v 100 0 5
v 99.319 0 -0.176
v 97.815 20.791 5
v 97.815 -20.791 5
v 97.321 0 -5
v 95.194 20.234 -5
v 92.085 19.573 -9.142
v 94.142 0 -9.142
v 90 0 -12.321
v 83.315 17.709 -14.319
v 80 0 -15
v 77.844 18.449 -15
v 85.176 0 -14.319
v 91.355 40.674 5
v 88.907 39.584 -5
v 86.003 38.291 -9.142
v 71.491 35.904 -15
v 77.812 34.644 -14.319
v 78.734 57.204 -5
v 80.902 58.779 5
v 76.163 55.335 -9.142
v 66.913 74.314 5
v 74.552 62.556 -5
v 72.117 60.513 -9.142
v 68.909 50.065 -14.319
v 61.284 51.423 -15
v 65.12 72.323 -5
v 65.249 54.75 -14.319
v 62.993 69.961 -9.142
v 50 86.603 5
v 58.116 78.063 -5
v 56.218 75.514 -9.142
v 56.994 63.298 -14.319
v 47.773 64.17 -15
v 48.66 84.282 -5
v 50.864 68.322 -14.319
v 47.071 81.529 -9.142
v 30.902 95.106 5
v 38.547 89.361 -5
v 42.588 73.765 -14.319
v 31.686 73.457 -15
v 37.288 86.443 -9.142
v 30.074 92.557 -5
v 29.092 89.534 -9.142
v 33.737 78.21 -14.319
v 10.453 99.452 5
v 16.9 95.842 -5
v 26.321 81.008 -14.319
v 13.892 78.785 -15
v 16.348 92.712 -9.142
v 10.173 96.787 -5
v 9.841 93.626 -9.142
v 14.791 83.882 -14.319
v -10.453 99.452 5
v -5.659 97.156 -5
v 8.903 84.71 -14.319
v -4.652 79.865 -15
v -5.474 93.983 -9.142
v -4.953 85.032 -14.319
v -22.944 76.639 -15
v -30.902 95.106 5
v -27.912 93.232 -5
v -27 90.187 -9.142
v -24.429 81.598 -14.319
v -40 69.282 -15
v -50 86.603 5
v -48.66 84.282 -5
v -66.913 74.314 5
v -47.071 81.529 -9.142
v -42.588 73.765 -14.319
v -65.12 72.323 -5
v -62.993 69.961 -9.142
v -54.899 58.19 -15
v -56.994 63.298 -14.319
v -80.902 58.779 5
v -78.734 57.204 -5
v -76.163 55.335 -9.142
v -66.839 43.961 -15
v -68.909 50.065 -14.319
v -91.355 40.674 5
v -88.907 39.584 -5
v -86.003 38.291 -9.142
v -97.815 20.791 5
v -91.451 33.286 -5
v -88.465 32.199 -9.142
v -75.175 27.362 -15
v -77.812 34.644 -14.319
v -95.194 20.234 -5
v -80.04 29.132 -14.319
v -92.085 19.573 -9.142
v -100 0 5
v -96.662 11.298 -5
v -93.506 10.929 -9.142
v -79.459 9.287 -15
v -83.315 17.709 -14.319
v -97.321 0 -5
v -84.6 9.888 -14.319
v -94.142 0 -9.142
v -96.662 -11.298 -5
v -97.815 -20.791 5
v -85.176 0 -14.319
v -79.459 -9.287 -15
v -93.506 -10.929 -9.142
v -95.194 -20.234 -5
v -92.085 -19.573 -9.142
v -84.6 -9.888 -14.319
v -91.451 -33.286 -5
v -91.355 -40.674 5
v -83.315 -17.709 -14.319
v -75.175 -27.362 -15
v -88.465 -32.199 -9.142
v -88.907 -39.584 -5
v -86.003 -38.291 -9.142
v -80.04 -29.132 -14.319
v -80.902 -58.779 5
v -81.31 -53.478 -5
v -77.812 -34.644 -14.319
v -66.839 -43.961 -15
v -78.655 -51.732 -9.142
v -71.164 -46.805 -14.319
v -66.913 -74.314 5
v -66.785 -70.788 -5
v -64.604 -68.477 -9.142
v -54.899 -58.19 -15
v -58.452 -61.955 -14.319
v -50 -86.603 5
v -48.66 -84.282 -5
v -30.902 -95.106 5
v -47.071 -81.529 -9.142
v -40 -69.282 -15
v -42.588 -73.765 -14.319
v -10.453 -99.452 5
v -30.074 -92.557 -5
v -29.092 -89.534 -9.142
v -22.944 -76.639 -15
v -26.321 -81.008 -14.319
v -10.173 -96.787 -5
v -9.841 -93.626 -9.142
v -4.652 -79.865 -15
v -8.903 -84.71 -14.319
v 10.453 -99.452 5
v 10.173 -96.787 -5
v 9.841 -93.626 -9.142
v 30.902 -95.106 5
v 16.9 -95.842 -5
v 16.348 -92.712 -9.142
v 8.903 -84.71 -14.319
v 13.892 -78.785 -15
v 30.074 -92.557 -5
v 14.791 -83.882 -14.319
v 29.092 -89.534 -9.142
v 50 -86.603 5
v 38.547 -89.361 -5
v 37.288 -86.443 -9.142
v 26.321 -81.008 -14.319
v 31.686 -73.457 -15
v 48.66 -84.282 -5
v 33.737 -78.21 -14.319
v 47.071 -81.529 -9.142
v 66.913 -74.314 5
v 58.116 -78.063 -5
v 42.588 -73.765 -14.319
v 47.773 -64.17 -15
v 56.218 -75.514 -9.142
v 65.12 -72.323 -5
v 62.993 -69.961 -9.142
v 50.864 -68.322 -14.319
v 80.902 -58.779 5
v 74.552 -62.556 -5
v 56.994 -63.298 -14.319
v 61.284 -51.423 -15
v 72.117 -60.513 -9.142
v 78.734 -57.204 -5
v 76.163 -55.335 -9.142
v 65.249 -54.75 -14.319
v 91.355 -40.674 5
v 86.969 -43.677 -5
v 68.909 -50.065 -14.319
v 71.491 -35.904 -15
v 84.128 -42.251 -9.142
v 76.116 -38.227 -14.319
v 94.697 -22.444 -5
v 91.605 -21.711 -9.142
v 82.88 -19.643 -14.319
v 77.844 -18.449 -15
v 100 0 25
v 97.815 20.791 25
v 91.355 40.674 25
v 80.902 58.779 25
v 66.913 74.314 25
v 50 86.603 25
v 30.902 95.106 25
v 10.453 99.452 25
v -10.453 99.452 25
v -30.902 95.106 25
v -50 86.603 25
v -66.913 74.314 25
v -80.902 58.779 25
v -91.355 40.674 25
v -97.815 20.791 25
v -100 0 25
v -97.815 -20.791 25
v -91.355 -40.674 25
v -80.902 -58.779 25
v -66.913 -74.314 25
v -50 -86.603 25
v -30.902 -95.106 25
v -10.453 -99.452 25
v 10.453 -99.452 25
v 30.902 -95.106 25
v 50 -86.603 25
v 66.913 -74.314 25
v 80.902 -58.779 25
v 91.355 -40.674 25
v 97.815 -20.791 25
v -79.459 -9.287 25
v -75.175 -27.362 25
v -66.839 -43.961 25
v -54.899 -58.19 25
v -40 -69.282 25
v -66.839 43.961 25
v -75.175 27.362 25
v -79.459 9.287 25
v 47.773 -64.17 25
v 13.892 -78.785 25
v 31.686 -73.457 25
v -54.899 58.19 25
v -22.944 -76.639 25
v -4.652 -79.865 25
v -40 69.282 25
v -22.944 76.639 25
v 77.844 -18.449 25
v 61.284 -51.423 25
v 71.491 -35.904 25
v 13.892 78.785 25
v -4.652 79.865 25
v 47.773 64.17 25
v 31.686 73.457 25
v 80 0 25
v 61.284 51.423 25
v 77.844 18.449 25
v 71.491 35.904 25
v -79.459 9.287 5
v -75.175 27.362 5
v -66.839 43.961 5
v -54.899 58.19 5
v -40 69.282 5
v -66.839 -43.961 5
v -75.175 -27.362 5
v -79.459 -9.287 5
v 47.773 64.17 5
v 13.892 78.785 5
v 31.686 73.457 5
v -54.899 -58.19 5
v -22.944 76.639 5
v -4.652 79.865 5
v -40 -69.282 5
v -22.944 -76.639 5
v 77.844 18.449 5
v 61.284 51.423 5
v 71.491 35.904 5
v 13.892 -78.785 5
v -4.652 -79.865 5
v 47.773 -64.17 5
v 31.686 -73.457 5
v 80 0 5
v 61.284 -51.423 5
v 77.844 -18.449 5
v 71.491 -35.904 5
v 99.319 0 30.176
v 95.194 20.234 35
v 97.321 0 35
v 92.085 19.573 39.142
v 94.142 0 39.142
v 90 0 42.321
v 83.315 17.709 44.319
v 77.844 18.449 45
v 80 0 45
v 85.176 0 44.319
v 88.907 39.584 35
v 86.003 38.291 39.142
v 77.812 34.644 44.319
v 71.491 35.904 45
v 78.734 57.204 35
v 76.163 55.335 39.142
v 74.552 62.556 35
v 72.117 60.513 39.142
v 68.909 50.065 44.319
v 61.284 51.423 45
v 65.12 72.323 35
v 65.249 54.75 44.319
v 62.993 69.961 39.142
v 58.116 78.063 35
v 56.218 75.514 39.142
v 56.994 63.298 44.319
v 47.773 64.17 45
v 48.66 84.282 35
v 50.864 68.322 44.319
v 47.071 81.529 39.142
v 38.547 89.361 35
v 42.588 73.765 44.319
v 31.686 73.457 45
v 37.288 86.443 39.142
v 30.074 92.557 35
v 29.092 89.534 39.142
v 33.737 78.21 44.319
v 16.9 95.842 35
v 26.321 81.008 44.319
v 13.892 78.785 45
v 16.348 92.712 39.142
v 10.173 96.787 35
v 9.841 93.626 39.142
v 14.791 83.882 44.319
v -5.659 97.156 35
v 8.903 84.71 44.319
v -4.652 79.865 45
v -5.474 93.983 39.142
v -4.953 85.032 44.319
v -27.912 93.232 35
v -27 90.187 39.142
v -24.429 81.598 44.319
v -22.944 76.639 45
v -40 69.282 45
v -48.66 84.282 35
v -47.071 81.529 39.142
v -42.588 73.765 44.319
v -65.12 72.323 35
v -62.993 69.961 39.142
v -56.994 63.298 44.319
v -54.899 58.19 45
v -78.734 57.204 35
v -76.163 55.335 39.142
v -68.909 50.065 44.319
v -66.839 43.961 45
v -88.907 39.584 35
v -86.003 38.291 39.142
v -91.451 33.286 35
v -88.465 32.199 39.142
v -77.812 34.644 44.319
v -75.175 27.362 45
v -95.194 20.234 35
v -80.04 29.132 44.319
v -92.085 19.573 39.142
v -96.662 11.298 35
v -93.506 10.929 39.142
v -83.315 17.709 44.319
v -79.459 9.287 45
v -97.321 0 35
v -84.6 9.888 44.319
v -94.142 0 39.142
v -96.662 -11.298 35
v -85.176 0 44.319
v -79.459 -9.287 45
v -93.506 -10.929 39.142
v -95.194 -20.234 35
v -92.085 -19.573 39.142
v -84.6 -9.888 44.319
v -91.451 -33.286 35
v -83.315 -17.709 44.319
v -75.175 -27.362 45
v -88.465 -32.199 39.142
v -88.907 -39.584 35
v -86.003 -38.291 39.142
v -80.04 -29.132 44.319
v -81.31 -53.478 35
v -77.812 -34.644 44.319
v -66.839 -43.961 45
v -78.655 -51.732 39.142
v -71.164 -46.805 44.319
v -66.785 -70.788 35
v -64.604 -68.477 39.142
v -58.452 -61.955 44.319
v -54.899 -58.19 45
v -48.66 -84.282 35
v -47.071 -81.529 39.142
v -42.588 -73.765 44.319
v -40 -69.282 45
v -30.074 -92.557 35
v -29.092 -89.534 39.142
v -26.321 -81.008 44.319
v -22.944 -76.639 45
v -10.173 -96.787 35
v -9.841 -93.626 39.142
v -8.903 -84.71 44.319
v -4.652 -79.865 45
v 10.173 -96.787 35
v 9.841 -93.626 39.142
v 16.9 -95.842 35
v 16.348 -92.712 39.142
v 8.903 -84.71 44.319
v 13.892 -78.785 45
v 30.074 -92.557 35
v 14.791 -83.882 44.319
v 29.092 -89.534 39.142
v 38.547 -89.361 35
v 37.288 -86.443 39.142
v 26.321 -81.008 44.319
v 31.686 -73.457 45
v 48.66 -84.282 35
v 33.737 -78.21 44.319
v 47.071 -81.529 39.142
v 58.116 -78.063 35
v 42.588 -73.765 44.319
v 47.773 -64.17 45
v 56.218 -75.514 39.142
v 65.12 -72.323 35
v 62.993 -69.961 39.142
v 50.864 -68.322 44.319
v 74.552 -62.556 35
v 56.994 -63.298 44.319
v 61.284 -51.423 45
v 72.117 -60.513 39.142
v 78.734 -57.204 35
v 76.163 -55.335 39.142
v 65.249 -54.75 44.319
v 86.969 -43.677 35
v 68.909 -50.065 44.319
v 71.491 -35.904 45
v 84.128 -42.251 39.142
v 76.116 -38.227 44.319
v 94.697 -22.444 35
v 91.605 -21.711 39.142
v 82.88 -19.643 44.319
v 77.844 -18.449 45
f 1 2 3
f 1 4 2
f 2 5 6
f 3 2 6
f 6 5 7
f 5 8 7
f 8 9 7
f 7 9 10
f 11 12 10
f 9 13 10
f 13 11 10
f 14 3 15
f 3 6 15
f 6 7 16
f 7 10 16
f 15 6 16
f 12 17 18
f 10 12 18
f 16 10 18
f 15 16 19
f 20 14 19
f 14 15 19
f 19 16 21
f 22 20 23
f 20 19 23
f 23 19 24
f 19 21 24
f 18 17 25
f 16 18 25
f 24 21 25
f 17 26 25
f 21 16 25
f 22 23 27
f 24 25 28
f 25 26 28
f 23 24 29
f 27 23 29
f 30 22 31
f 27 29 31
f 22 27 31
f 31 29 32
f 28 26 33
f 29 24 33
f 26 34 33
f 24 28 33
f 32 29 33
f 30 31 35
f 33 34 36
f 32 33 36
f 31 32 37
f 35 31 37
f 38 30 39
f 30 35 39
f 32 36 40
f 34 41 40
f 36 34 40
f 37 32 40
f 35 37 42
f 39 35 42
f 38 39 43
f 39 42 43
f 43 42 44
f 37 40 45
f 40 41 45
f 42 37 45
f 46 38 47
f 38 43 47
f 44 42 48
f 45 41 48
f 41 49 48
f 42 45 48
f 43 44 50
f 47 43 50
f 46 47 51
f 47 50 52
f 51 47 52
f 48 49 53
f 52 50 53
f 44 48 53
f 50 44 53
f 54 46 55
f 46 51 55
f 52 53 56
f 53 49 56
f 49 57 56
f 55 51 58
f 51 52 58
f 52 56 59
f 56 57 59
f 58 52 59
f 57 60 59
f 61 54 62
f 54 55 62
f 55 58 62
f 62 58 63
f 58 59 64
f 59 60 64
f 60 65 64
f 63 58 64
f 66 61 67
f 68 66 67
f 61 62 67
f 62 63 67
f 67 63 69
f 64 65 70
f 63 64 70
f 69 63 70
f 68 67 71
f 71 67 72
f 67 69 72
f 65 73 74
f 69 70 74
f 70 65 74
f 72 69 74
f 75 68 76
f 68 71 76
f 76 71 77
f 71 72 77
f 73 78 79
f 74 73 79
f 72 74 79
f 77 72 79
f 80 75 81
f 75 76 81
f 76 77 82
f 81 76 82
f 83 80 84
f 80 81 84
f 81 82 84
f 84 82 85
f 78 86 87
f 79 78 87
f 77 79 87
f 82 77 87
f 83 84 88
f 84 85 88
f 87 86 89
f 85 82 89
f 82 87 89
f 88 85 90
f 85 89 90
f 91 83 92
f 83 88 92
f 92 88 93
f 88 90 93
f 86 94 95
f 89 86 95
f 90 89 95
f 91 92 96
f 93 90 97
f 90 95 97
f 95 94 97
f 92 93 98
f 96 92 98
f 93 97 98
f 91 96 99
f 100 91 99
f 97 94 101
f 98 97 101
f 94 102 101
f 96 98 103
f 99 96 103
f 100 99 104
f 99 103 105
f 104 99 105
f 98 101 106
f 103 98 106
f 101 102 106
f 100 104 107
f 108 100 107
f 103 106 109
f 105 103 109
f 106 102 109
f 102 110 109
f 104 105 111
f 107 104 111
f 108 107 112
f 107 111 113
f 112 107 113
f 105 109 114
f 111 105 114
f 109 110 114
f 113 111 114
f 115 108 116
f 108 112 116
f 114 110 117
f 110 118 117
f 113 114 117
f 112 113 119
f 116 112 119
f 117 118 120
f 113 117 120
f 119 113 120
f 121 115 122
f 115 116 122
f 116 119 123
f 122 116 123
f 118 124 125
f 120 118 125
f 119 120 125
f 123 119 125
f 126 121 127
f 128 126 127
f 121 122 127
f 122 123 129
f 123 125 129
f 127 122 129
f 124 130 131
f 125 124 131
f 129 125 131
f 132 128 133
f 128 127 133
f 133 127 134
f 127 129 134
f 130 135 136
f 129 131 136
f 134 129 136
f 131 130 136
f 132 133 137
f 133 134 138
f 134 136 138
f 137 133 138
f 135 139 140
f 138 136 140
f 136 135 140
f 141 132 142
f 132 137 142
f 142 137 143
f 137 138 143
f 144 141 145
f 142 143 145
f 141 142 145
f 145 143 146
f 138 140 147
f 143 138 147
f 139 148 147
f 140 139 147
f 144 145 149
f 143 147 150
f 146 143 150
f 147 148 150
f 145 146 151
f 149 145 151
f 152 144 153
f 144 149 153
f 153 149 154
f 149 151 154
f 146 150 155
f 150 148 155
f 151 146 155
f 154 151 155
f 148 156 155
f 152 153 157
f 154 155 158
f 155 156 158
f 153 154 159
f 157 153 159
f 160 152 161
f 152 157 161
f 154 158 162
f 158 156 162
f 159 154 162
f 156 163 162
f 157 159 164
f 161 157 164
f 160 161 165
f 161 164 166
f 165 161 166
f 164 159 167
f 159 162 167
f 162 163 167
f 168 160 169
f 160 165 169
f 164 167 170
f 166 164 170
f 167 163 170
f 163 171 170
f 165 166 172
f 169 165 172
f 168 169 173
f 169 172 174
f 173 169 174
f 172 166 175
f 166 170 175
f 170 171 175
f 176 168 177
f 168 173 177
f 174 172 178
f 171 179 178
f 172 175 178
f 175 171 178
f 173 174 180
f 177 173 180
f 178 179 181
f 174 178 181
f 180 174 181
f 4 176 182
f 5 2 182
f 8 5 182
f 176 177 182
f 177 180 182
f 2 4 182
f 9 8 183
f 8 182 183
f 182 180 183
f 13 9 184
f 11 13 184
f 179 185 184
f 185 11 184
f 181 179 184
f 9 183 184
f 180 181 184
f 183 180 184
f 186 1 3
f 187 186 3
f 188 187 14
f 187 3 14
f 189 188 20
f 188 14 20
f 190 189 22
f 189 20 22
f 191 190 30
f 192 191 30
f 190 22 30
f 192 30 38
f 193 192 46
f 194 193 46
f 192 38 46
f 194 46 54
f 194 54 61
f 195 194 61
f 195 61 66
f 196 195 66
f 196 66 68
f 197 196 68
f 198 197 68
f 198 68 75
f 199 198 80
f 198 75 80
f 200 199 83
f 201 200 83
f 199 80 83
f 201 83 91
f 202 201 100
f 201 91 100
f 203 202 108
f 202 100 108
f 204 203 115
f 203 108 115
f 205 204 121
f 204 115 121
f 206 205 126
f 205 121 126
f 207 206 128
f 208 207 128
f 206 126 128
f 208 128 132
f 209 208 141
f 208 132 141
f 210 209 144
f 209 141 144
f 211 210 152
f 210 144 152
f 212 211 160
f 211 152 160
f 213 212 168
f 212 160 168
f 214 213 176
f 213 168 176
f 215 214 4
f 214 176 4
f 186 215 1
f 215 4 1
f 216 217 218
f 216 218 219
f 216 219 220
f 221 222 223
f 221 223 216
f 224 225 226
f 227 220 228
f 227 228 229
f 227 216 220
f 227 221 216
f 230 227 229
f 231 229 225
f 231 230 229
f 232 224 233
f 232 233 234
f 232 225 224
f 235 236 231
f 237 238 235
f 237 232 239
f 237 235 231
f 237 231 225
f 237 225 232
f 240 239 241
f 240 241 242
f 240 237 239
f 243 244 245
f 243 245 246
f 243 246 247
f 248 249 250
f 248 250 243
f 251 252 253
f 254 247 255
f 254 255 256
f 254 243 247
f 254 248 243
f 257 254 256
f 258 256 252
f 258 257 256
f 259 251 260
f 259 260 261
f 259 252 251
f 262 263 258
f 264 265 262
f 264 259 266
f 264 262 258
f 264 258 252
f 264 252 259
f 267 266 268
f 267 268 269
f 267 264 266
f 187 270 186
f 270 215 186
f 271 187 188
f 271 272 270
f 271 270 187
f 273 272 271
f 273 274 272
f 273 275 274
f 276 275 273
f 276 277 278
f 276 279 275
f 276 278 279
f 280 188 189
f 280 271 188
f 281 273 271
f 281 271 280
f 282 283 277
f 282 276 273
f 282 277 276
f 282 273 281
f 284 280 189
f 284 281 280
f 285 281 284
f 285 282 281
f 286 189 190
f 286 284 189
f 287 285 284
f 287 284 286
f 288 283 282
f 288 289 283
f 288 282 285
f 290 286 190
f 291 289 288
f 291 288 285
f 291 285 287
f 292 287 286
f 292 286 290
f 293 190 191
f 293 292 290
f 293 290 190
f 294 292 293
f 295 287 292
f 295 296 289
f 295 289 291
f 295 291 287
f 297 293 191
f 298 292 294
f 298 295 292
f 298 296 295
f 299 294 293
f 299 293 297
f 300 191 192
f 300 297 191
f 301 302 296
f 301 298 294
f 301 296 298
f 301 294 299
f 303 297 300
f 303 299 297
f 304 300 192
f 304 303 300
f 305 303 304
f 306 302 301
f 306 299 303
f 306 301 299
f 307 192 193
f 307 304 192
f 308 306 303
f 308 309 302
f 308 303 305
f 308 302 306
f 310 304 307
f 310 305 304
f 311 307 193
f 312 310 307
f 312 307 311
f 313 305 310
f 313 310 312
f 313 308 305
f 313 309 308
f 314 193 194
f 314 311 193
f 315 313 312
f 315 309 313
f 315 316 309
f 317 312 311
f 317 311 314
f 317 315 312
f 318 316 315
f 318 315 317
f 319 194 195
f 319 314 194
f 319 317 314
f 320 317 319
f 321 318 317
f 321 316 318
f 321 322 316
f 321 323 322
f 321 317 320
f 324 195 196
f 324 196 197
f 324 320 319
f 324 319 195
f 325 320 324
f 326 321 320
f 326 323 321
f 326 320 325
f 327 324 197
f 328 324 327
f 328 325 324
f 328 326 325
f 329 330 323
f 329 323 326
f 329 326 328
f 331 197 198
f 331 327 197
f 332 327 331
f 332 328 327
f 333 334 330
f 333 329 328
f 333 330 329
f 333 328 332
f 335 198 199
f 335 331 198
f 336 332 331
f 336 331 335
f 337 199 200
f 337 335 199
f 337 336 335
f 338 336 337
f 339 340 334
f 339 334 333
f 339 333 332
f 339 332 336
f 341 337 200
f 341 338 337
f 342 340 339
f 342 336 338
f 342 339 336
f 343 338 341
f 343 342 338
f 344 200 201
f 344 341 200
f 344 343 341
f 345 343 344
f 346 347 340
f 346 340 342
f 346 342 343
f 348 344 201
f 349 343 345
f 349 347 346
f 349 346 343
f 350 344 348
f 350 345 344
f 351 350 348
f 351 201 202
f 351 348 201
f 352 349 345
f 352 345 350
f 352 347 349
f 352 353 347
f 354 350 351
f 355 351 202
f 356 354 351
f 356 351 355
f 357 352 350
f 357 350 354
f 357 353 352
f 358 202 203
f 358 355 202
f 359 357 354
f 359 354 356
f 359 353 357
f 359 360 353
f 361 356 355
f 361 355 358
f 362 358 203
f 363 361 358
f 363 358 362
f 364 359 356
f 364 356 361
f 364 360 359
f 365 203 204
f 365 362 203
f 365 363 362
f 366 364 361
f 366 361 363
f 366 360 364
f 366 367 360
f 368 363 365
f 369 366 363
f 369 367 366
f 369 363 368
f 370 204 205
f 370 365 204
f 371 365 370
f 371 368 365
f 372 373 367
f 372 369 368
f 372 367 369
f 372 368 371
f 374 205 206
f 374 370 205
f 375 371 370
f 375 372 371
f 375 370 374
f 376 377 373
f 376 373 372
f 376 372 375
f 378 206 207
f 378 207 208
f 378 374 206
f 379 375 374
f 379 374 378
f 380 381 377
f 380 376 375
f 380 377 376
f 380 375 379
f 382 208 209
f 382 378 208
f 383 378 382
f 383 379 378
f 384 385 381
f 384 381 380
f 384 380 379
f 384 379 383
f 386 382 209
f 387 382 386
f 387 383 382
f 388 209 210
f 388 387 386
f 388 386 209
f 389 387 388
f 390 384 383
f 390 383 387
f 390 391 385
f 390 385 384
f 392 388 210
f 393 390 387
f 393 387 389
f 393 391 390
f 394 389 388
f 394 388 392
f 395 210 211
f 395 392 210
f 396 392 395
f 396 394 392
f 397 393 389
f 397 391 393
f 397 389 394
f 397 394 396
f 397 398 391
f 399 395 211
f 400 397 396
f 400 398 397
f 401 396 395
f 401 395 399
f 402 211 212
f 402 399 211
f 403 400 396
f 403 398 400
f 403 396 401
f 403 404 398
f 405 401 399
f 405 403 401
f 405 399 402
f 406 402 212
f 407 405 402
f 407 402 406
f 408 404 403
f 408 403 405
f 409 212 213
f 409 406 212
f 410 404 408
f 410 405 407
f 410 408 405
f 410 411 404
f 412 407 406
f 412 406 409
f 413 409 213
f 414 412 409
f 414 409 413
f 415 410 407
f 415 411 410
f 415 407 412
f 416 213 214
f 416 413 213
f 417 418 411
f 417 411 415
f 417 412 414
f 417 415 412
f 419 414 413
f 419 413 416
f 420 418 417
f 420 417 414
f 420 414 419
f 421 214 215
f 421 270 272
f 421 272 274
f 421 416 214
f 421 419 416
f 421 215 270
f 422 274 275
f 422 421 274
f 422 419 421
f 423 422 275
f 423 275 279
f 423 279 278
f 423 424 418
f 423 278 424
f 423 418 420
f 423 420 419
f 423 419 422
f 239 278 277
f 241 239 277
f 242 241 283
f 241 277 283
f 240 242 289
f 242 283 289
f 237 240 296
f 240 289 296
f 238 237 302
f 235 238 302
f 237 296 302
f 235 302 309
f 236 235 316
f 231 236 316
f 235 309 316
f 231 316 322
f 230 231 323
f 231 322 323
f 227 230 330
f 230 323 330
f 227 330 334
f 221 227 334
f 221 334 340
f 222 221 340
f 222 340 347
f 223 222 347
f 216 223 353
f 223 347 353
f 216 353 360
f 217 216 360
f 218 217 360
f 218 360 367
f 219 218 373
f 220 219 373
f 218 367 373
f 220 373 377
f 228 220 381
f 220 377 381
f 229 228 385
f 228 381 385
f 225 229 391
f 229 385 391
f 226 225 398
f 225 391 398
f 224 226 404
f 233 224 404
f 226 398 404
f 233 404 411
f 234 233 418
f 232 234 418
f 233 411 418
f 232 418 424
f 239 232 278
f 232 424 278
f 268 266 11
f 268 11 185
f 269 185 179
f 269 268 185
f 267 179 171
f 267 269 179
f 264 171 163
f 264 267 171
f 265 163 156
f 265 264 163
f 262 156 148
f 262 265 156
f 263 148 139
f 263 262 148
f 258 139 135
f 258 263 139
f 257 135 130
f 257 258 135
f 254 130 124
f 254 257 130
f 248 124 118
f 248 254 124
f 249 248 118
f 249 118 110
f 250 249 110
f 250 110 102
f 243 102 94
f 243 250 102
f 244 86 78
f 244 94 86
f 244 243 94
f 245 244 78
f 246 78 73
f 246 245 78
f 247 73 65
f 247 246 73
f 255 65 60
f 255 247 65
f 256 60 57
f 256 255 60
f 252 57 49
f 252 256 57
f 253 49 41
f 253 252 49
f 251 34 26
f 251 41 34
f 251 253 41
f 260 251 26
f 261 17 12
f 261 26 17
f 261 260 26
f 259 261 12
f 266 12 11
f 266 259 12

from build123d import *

# Parameters (mm, degrees)
SKETCH1_R           = 50
BOSS_EXTRUDE1_DEPTH = 30
FILLET1_R           = 10
SKETCH2_R           = 40
CUT_EXTRUDE1_DEPTH  = 10
CUT_EXTRUDE2_START  = -10
SKETCH3_R           = 40
CUT_EXTRUDE2_DEPTH  = 10
SCALE1_SCALE        = 2


with BuildPart() as part:
    # Sketch1 → Boss-Extrude1 (new body)
    with BuildSketch(Plane.XY):
        Circle(SKETCH1_R)
    extrude(amount=BOSS_EXTRUDE1_DEPTH)

    # Fillet1
    fillet1_edges = [part.edges().sort_by_distance(p)[0] for p in [
        (-50, 0, 0),
        (-50, 0, 30),
    ]]
    fillet(fillet1_edges, radius=FILLET1_R)

    # Sketch2 → Cut-Extrude1 (cut)
    with BuildSketch(Plane.XY.offset(30)):
        Circle(SKETCH2_R)
    extrude(amount=-CUT_EXTRUDE1_DEPTH, mode=Mode.SUBTRACT)

    # Sketch3 → Cut-Extrude2 (cut)
    with BuildSketch(Plane(origin=(0, 0, 0), x_dir=(-1, 0, 0), z_dir=(0, 0, -1)).offset(CUT_EXTRUDE2_START)):
        with Locations(Location((0, 0, 0), (0, 0, 180))):
            Circle(SKETCH3_R)
    extrude(amount=CUT_EXTRUDE2_DEPTH, mode=Mode.SUBTRACT)


with BuildPart() as part_1:
    # Scale1: scaled about (0, 0, 15)
    add(part.part.scale(SCALE1_SCALE).moved(Location((0, 0, -15))))


solid = part_1.part
